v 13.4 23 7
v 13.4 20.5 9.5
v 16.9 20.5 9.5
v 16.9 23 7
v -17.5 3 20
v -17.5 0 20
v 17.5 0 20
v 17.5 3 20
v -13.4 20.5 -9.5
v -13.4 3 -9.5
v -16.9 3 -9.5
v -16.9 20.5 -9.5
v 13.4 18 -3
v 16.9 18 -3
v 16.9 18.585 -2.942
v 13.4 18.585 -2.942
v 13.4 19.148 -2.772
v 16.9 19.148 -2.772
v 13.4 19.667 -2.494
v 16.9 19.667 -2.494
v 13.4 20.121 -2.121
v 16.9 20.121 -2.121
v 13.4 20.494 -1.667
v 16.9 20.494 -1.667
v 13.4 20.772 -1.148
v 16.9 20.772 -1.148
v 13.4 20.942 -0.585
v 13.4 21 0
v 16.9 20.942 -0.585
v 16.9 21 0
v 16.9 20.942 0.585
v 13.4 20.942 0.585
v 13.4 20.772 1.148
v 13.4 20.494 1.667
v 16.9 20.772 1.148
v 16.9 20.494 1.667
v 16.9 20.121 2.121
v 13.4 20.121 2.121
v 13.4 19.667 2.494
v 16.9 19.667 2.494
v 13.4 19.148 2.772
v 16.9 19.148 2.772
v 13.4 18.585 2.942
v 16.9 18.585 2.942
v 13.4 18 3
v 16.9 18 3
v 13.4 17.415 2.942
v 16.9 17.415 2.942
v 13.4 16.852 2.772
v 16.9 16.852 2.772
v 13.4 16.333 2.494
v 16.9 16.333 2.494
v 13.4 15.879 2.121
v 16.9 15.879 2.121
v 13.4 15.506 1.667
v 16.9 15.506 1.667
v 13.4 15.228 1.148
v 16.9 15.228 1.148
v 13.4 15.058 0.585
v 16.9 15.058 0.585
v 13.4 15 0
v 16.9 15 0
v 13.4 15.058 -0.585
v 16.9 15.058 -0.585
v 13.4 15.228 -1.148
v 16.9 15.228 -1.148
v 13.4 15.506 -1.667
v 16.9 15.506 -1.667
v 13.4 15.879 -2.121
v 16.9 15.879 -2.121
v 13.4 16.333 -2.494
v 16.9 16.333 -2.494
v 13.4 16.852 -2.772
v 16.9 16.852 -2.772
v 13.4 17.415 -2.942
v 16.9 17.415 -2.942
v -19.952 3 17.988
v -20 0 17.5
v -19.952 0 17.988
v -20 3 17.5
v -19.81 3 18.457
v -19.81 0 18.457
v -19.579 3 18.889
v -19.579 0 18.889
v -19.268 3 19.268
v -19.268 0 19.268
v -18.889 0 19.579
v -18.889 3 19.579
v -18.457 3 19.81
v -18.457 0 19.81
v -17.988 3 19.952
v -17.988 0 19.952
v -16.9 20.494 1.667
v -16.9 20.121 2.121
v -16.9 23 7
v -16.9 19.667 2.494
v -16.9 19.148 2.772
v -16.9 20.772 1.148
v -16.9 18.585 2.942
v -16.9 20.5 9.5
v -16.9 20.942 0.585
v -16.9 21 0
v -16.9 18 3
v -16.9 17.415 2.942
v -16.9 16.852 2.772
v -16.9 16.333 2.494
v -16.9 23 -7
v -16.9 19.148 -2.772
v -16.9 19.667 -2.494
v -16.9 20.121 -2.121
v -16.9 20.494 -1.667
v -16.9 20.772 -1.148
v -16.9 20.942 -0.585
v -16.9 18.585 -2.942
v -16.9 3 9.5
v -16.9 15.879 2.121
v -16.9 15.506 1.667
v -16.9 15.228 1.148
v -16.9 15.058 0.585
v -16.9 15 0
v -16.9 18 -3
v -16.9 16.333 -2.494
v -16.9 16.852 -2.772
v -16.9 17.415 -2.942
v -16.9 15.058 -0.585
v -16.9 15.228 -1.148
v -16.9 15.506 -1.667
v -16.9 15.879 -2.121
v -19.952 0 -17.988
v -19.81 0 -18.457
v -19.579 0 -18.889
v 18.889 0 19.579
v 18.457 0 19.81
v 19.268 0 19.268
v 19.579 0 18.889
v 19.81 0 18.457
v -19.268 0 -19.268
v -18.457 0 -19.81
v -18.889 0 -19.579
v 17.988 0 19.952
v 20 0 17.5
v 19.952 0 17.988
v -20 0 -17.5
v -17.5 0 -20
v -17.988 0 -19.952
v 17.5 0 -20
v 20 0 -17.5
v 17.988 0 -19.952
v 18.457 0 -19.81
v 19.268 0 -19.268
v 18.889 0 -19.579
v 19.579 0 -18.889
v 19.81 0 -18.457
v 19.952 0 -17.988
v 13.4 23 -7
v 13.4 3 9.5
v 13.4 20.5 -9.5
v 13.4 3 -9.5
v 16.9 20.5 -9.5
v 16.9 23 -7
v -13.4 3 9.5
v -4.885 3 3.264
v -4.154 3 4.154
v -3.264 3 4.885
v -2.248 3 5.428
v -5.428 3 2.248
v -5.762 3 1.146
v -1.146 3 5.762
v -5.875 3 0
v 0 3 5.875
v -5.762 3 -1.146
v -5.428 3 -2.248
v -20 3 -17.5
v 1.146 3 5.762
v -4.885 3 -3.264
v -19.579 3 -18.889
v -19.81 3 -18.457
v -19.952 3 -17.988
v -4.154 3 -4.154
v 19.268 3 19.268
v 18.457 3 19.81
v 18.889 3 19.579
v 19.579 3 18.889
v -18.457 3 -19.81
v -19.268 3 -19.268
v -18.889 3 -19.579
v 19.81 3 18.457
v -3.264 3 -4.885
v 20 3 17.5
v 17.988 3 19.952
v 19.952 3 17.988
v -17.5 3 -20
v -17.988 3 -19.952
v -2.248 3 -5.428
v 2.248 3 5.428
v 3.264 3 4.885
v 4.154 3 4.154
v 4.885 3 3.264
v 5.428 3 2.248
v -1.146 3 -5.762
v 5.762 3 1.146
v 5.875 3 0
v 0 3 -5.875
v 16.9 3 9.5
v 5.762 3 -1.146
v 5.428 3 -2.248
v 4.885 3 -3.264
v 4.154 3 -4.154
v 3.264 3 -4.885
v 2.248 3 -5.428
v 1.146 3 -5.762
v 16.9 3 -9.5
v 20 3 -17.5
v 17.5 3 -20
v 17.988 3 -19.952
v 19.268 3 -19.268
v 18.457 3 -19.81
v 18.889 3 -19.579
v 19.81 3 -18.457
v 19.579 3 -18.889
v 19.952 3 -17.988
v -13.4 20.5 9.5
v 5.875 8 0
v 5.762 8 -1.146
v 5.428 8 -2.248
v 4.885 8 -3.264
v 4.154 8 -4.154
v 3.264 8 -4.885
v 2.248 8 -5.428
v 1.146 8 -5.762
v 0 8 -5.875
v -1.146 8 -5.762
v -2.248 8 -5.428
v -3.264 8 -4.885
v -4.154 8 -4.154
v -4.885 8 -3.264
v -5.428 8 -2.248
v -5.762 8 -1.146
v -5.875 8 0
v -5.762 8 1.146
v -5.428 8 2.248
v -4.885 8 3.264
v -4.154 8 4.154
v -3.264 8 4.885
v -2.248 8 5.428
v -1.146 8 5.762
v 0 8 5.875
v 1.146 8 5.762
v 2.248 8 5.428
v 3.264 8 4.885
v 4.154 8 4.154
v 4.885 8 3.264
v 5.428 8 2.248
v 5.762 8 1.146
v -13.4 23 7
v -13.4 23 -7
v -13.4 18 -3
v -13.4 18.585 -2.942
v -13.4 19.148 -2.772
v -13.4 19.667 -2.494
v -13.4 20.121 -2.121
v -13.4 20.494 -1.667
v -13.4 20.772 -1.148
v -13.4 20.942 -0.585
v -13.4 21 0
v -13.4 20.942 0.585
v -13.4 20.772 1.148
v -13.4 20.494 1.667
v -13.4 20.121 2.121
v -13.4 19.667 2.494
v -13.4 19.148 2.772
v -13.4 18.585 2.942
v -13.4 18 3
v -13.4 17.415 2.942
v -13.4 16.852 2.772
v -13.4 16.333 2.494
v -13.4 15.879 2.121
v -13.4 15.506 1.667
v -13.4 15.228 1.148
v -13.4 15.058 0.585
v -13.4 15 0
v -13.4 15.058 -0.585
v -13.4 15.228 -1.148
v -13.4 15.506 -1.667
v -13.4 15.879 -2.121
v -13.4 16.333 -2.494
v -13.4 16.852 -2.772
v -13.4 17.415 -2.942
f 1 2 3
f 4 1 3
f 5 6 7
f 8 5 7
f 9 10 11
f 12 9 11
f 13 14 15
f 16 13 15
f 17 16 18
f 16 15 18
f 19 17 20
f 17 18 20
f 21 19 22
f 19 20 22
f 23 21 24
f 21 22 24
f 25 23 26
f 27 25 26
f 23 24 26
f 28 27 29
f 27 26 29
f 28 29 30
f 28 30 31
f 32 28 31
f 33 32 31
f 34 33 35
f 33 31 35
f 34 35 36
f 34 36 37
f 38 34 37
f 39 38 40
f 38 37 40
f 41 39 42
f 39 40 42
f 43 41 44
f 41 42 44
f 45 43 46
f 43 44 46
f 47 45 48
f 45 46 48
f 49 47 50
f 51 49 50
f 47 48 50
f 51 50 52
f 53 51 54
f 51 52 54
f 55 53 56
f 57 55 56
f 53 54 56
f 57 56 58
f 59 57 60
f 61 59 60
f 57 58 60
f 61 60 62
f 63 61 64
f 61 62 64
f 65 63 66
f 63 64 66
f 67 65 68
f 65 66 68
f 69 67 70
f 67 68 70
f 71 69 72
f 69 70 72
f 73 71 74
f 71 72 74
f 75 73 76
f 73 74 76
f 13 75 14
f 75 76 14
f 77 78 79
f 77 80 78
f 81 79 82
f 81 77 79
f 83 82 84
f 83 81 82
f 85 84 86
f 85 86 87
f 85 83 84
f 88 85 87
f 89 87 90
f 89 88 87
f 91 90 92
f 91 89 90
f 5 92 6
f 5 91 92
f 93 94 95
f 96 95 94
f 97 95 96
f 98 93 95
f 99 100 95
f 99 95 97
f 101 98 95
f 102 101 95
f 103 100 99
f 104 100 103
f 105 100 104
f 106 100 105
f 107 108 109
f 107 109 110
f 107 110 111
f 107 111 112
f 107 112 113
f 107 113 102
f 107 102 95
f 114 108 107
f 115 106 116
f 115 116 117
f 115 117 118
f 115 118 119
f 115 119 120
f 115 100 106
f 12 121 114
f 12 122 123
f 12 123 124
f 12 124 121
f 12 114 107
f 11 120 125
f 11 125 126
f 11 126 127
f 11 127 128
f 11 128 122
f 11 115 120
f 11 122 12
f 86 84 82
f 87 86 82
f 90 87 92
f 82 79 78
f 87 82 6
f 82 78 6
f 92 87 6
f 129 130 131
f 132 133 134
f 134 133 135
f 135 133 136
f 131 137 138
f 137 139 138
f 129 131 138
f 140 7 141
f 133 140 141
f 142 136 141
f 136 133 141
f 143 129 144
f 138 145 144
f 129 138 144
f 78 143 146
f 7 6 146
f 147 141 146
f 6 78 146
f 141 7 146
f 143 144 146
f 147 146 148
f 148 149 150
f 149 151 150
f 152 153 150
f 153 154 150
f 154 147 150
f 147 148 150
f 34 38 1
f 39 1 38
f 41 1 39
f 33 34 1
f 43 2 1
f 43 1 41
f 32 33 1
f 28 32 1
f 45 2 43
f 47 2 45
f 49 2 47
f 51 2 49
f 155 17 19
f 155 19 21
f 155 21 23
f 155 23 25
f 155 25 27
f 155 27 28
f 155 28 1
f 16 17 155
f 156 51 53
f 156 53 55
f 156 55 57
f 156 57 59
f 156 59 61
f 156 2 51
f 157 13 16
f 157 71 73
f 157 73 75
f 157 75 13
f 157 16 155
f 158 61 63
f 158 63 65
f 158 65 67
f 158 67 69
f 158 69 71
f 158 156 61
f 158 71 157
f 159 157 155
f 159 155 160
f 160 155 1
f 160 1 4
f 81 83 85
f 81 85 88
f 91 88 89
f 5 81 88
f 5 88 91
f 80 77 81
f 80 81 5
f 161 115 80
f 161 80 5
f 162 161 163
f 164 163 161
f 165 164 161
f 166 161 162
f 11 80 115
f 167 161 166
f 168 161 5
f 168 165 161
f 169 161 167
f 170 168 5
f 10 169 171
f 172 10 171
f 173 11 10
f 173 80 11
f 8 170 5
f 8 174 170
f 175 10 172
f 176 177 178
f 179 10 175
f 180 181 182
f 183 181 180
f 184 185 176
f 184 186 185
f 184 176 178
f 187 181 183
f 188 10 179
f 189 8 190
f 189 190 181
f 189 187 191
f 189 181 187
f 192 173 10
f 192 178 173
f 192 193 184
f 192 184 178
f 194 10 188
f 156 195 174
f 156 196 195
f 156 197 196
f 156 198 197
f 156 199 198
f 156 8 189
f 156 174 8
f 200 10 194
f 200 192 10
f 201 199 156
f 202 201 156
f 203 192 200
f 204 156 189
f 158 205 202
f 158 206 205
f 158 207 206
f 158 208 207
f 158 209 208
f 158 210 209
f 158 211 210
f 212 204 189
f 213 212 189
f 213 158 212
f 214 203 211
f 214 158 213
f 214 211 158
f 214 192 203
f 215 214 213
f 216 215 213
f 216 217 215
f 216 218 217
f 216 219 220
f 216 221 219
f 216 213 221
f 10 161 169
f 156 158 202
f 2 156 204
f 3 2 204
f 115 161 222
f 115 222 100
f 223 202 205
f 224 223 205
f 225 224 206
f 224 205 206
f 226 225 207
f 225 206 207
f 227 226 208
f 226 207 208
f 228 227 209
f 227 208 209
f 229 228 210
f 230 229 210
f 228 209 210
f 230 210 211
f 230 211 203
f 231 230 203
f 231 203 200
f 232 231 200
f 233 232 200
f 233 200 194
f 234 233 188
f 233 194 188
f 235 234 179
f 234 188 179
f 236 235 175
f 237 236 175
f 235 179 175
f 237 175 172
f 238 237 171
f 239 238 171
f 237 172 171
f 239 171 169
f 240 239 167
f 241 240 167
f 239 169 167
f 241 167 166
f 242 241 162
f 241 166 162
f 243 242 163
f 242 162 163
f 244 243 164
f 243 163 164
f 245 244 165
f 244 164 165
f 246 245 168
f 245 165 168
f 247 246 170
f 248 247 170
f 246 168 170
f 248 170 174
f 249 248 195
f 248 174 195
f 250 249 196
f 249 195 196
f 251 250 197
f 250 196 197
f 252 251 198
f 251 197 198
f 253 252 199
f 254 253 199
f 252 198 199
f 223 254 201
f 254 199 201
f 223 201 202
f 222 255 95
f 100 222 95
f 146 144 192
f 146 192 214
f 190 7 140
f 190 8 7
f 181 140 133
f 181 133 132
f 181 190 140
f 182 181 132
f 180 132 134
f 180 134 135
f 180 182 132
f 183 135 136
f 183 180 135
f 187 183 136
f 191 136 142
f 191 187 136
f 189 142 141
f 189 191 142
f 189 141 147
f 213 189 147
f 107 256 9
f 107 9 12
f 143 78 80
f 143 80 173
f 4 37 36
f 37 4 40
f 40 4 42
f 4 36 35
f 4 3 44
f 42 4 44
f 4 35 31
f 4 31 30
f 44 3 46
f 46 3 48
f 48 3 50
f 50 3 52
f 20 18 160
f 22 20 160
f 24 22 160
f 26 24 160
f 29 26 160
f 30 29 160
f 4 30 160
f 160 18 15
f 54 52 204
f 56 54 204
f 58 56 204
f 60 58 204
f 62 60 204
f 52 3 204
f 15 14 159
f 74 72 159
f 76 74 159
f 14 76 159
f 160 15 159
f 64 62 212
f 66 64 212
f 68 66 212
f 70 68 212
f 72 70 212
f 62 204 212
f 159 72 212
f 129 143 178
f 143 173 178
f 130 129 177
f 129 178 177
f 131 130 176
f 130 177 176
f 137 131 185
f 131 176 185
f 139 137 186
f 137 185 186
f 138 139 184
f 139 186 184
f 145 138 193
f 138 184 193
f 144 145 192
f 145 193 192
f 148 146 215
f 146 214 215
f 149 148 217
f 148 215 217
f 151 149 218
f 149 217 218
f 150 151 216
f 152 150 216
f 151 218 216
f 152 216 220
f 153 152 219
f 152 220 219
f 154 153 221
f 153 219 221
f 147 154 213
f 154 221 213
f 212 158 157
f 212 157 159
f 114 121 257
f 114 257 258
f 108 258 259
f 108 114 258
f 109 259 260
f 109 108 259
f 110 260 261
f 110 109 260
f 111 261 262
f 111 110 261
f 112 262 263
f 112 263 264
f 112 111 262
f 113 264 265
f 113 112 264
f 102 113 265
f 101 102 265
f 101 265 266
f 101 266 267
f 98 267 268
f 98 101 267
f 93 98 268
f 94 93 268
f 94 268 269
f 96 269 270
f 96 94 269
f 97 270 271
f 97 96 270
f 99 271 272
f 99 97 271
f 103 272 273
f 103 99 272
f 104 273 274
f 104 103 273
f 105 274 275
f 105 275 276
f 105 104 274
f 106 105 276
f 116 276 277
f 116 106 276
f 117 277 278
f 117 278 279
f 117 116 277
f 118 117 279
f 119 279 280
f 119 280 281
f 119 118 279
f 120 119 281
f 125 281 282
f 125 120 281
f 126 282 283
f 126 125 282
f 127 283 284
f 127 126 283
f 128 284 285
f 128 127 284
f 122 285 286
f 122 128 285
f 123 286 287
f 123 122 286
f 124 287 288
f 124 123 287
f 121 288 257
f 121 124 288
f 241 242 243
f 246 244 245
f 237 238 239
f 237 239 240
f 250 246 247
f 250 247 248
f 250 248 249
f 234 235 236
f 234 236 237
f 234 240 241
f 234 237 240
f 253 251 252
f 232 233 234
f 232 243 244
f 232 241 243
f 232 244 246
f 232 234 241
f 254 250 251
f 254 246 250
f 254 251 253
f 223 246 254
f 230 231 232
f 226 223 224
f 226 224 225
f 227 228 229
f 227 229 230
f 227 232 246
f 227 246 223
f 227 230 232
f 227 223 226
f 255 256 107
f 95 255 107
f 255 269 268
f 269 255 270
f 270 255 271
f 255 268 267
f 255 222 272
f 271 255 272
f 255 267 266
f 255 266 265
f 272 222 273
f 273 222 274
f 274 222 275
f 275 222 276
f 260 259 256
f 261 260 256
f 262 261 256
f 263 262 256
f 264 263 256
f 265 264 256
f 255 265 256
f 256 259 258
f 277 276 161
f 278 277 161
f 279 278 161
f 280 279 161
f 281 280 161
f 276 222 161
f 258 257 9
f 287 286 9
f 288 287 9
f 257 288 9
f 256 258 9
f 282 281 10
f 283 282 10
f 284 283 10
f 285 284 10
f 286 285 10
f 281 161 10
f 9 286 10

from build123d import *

# Parameters (mm, degrees)
SKETCH1_W           = 40
SKETCH1_H           = 40
BOSS_EXTRUDE1_DEPTH = 3
SKETCH2_R           = 5.875
BOSS_EXTRUDE2_DEPTH = 5
SKETCH3_W           = 3.5
SKETCH3_H           = 19
BOSS_EXTRUDE3_DEPTH = 20
SKETCH4_R           = 3
CUT_EXTRUDE1_DEPTH  = 3.5
FILLET1_R           = 2.5
CHAMFER1_SIZE       = 2.5


with BuildPart() as part:
    # Sketch1 → Boss-Extrude1 (new body)
    with BuildSketch(Plane(origin=(0, 0, 0), x_dir=(1, 0, 0), z_dir=(0, 1, 0))):
        Rectangle(SKETCH1_W, SKETCH1_H)
    extrude(amount=BOSS_EXTRUDE1_DEPTH)

    # Sketch2 → Boss-Extrude2 (add)
    with BuildSketch(Plane(origin=(0, 3, 0), x_dir=(1, 0, 0), z_dir=(0, 1, 0))):
        Circle(SKETCH2_R)
    extrude(amount=BOSS_EXTRUDE2_DEPTH)

    # Sketch3 → Boss-Extrude3 (add)
    with BuildSketch(Plane(origin=(0, 3, 0), x_dir=(1, 0, 0), z_dir=(0, 1, 0))):
        with Locations((15.15, 0)):
            Rectangle(SKETCH3_W, SKETCH3_H)
    boss_extrude3 = extrude(amount=BOSS_EXTRUDE3_DEPTH)

    # Sketch4 → Cut-Extrude1 (cut)
    with BuildSketch(Plane(origin=(16.9, 0, 0), x_dir=(0, 0, -1), z_dir=(1, 0, 0))):
        with Locations((0, 18)):
            Circle(SKETCH4_R)
    cut_extrude1 = extrude(amount=-CUT_EXTRUDE1_DEPTH, mode=Mode.SUBTRACT)

    # Fillet1
    fillet1_edges = [part.edges().sort_by_distance(p)[0] for p in [
        (20, 1.5, 20),
        (-20, 1.5, 20),
        (-20, 1.5, -20),
        (20, 1.5, -20),
    ]]
    fillet(fillet1_edges, radius=FILLET1_R)

    # Mirror1: Boss-Extrude3, Cut-Extrude1 across plane
    add(boss_extrude3.mirror(Plane(origin=(0, 0, 0), x_dir=(0, 0, 1), z_dir=(1, 0, 0))))
    add(cut_extrude1.mirror(Plane(origin=(0, 0, 0), x_dir=(0, 0, 1), z_dir=(1, 0, 0))), mode=Mode.SUBTRACT)

    # Chamfer1
    chamfer1_edges = [part.edges().sort_by_distance(p)[0] for p in [
        (15.15, 23, -9.5),
        (15.15, 23, 9.5),
        (-15.15, 23, 9.5),
        (-15.15, 23, -9.5),
    ]]
    chamfer(chamfer1_edges, length=CHAMFER1_SIZE)


solid = part.part
